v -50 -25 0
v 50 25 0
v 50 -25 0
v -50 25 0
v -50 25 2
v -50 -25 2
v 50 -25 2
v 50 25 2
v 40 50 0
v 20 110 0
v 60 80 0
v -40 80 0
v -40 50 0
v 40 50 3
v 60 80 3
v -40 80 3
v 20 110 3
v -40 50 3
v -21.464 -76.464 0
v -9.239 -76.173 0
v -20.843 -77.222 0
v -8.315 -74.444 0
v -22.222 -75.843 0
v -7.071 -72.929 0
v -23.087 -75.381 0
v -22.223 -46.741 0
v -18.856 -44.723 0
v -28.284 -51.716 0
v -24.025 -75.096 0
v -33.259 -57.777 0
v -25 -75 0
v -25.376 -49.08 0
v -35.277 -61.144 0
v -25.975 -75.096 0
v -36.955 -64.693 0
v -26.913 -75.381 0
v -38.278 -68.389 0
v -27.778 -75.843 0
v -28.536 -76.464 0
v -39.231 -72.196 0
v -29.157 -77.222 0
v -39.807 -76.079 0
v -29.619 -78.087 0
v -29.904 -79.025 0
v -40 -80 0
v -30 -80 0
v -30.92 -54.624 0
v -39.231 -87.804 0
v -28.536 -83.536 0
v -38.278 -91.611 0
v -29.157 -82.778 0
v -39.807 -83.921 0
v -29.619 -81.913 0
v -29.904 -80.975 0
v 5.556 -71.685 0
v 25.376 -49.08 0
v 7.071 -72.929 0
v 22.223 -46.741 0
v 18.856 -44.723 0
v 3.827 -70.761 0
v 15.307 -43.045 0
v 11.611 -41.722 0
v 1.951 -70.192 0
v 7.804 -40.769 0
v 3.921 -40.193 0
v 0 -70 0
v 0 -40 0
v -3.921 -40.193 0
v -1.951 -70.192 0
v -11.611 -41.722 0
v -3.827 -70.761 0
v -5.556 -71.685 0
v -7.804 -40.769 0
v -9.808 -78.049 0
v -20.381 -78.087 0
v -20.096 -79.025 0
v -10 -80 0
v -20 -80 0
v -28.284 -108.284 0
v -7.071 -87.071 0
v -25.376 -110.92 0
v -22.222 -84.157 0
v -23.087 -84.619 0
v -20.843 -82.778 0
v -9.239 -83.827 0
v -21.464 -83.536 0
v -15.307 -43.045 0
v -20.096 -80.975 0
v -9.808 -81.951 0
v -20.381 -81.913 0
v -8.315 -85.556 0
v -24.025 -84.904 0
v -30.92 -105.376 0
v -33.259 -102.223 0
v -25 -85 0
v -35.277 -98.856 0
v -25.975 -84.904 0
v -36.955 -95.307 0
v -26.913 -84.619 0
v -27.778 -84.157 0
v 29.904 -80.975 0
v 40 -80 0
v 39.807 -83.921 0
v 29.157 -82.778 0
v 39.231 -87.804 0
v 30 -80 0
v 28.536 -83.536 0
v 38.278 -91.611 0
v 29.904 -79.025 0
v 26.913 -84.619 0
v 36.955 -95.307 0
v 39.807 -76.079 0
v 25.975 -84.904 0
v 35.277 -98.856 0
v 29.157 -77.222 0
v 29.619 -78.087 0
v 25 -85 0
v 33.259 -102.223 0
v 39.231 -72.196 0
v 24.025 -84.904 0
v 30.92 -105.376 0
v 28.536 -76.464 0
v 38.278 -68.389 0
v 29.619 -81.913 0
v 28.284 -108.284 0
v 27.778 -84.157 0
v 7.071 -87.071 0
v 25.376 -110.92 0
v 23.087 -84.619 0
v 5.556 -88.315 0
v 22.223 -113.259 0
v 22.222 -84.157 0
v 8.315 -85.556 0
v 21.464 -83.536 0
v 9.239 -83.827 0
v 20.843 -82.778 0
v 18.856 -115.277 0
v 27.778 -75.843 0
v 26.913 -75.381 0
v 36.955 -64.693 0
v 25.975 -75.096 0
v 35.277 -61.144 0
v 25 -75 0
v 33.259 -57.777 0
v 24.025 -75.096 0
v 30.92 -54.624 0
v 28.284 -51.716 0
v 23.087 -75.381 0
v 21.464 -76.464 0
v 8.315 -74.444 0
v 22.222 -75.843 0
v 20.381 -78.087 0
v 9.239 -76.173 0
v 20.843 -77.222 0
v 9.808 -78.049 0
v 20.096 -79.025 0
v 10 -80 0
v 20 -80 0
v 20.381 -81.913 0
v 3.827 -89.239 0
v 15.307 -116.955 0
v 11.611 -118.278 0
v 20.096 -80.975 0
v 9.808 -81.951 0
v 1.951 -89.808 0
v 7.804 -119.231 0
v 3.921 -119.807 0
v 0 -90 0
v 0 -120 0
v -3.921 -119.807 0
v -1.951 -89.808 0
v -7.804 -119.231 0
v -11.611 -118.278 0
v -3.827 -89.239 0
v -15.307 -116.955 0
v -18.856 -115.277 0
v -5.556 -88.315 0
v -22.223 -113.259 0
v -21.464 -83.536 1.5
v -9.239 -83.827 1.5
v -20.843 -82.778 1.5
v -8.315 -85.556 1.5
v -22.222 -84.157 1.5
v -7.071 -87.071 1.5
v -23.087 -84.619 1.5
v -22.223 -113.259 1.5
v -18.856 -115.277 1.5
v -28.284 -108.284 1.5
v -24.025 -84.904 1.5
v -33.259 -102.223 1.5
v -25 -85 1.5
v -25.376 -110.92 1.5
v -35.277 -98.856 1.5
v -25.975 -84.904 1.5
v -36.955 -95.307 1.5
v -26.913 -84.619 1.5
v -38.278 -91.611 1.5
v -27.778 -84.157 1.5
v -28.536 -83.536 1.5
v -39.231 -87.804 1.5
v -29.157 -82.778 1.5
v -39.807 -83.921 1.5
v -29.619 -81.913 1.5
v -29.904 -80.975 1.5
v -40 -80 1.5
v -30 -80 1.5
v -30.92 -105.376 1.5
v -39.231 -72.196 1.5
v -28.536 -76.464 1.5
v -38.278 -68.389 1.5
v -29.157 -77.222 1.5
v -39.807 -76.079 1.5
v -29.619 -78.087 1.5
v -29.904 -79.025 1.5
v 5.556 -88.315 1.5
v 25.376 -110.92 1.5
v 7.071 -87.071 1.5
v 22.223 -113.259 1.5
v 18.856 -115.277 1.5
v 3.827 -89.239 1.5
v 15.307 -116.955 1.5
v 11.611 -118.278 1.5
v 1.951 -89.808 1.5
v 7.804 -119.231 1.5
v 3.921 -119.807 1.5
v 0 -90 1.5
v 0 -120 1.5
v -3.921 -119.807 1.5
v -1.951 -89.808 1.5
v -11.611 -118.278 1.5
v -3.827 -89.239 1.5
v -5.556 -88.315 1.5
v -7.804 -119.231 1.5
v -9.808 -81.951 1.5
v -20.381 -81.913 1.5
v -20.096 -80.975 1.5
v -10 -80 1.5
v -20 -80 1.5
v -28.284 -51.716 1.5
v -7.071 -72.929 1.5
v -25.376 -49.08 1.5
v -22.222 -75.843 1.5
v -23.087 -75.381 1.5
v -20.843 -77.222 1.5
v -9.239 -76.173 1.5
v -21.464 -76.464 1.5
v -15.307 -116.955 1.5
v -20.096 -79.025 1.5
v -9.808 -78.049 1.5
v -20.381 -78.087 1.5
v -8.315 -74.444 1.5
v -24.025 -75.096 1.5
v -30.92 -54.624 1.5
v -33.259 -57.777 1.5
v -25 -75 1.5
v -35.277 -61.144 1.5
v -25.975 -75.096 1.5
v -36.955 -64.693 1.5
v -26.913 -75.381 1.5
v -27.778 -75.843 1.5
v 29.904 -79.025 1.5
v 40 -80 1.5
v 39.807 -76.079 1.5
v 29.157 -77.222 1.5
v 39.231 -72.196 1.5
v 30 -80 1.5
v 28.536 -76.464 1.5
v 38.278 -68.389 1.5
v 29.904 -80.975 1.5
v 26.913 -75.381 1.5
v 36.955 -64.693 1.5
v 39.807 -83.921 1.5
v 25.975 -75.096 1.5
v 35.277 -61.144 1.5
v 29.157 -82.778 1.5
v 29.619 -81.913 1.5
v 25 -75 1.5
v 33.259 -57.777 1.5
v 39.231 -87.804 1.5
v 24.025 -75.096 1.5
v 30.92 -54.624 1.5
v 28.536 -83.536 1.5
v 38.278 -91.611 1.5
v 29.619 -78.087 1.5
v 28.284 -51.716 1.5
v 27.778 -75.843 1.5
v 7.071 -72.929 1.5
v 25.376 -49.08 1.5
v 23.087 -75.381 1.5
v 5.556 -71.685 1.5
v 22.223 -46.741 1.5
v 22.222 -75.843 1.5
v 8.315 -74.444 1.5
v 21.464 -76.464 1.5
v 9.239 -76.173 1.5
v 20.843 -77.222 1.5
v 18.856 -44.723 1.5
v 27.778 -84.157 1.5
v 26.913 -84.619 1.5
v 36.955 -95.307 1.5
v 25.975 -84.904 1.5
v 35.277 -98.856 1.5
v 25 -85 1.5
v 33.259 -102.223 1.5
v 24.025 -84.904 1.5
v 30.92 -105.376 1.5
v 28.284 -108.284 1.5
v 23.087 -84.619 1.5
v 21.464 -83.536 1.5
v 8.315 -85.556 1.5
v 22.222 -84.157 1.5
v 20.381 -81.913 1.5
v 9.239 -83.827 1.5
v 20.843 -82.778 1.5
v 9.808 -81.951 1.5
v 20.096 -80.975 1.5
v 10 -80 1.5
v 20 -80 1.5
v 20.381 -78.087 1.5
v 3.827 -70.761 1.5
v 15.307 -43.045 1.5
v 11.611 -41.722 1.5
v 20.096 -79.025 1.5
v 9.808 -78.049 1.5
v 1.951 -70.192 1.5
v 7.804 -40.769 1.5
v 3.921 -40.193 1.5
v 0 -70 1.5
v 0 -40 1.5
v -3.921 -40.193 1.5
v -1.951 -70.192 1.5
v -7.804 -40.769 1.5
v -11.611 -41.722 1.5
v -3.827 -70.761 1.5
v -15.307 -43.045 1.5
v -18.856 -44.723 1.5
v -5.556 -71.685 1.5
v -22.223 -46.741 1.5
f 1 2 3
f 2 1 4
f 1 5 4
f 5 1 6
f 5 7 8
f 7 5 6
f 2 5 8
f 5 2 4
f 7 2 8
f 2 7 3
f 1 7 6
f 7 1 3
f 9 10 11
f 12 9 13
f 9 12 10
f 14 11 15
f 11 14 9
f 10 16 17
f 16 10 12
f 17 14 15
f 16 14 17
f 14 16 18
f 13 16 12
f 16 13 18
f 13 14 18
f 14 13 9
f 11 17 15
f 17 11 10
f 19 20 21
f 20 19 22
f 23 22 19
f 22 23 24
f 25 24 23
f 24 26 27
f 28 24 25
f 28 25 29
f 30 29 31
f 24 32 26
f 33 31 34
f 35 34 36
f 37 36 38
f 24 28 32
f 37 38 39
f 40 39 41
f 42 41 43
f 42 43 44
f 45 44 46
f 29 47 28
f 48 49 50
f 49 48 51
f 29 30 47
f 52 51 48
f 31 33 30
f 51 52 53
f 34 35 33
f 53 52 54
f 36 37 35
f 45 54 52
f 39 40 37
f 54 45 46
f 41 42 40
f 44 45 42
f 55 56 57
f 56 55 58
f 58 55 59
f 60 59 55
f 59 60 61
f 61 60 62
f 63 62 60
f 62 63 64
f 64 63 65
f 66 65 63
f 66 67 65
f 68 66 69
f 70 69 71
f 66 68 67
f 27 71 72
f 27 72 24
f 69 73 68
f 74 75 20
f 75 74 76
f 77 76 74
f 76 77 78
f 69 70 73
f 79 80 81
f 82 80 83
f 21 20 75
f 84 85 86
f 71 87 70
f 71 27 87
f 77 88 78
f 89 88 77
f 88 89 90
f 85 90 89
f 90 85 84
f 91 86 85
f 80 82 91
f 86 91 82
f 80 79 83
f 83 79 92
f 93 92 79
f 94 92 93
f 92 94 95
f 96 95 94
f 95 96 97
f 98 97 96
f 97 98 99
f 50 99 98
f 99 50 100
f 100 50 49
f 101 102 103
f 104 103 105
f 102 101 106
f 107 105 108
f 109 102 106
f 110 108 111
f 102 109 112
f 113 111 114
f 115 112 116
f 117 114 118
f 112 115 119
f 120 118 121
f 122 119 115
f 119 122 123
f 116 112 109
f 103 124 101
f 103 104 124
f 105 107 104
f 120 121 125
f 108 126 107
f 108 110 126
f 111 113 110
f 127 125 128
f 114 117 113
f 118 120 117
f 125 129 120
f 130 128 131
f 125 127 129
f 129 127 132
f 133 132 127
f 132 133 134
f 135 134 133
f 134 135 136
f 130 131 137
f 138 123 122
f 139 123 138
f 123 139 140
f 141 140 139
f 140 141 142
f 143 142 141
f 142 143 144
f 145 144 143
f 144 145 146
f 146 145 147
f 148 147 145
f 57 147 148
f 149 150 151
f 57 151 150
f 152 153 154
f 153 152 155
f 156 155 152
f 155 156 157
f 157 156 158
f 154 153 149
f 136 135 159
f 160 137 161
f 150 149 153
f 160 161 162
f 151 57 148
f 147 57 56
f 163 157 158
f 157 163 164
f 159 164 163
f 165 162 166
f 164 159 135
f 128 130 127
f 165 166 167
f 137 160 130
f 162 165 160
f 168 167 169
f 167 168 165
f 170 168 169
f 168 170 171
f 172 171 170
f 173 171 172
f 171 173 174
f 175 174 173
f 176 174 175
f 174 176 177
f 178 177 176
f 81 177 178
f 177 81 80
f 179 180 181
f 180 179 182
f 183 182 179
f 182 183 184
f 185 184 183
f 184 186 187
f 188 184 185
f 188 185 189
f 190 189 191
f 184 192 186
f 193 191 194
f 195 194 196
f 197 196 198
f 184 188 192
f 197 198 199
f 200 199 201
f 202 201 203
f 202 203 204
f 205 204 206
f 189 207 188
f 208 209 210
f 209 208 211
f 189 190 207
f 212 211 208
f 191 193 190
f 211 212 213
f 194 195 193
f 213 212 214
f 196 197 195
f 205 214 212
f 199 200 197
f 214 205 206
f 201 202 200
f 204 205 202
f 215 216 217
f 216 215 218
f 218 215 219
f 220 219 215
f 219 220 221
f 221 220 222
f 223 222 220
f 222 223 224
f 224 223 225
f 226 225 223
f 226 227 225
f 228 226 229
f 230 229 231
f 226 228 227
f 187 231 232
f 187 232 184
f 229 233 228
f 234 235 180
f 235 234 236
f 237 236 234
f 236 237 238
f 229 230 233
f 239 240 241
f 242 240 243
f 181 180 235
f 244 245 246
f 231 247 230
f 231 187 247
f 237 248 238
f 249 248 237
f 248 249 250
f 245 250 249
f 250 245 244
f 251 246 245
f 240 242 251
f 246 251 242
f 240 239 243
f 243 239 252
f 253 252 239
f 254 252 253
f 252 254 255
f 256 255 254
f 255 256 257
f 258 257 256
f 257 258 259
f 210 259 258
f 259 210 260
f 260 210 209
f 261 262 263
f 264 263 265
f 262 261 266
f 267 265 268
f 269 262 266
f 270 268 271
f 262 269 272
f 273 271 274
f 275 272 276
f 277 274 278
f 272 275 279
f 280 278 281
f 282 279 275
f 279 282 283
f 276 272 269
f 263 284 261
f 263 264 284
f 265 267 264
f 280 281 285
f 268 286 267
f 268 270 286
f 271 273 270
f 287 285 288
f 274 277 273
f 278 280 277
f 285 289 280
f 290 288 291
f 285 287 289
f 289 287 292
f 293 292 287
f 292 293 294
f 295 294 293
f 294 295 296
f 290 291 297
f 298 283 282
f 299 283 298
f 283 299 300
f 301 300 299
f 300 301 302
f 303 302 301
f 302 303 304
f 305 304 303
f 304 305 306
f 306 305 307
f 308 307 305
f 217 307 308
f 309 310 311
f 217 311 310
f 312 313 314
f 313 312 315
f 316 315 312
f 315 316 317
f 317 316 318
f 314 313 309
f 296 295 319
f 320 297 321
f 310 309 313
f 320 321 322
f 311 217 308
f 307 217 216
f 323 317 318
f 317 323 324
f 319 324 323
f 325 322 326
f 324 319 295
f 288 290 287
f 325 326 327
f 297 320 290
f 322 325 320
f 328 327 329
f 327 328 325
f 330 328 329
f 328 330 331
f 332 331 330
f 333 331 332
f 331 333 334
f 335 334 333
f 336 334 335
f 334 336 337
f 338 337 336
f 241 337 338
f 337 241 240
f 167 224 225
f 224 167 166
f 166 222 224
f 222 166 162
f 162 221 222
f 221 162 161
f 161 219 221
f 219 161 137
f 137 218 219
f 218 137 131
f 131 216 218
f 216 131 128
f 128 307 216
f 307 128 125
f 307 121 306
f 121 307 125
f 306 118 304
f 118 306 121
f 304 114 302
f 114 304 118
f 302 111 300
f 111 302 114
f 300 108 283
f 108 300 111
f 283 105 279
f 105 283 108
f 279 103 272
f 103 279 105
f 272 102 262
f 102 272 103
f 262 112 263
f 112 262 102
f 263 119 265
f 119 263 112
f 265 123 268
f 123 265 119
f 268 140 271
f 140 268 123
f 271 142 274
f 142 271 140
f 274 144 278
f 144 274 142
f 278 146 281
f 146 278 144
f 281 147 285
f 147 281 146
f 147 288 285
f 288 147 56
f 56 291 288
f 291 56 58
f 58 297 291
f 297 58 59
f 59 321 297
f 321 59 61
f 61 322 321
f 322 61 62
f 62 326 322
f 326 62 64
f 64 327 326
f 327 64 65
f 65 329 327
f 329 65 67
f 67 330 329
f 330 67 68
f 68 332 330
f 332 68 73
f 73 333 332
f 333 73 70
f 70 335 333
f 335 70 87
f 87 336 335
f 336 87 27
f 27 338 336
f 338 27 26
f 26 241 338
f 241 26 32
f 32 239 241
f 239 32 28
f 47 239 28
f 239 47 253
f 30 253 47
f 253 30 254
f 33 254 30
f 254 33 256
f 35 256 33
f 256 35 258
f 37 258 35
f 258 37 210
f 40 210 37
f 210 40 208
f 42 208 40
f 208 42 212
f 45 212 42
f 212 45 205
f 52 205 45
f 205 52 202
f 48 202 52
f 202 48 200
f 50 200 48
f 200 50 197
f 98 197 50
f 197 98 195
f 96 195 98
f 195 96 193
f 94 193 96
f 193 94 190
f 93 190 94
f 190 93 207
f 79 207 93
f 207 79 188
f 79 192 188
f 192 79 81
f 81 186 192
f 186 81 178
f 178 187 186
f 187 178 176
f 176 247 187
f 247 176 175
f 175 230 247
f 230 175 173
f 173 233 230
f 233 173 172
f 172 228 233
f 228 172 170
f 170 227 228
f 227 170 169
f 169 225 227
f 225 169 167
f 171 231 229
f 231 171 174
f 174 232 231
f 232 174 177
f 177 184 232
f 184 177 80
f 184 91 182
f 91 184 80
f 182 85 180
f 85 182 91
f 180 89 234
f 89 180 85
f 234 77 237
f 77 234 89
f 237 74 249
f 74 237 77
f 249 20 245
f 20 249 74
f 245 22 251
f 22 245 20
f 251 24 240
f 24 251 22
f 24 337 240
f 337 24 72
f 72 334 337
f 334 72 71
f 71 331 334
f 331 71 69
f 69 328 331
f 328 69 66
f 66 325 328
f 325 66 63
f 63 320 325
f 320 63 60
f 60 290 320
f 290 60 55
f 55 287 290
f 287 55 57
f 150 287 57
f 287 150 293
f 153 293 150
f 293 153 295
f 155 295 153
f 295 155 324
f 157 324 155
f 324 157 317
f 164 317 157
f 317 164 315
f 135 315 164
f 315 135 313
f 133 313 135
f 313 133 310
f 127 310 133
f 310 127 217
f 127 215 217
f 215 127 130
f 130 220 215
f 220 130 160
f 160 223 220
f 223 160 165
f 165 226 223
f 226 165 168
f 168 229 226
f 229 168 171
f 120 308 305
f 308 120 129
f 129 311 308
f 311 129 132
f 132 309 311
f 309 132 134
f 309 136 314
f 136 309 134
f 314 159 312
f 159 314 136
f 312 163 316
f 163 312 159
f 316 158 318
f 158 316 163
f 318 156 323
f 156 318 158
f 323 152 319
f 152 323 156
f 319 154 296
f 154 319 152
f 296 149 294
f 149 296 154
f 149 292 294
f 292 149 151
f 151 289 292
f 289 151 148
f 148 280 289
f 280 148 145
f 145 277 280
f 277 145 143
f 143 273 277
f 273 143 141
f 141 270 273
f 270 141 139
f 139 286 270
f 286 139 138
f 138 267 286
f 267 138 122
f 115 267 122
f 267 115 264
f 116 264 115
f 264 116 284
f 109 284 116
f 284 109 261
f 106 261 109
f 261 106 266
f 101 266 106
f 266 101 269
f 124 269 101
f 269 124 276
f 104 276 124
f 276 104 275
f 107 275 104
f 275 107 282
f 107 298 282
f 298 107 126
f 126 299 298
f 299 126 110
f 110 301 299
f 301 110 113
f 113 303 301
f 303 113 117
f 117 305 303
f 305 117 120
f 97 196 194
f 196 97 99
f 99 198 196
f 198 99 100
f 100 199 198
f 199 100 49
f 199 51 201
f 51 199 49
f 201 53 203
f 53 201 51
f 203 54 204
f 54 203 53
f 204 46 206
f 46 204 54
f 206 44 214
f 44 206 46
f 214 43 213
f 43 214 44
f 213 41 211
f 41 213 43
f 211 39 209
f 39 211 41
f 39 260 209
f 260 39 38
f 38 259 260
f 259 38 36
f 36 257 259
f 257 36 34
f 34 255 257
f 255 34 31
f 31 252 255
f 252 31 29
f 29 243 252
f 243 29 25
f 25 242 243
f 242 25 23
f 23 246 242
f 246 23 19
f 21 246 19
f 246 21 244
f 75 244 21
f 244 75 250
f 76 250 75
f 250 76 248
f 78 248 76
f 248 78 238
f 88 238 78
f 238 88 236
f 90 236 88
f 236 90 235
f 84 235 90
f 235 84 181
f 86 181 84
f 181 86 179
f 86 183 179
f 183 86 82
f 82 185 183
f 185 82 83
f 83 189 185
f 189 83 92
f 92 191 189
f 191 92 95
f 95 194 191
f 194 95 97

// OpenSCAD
// --------------------------------------------------------
// Parametric "Base Wall" (Planar Sheet Metal)
// --------------------------------------------------------

// The module applies a uniform thickness to ANY 2D shape provided to it.
module base_wall(thickness) {
    // linear_extrude pushes the 2D shape up along the Z-axis
    linear_extrude(height = thickness) {
        children(); // This pulls in whatever 2D geometry is nested inside the module call
    }
}

// ==========================================
// Example Usage & Visualization
// ==========================================

// Example 1: A simple rectangular Base Wall (e.g., a standard blank)
color("Silver")
base_wall(thickness = 2) {
    // This is your "Sketch"
    square([100, 50], center = true);
}

// Example 2: A Base Wall from a custom profile (Polygon)
translate([0, 70, 0])
color("LightSlateGray")
base_wall(thickness = 3) {
    // This represents a custom sketched boundary
    polygon(points=[
        [-40, -20], 
        [40, -20], 
        [60, 10], 
        [20, 40], 
        [-40, 10]
    ]);
}

// Example 3: A Base Wall with internal cutouts sketched directly into it
translate([0, -80, 0])
color("SteelBlue")
base_wall(thickness = 1.5) {
    // In CATIA, putting a circle inside another circle in a sketch creates a hole.
    // In OpenSCAD, we use 2D difference() inside the base_wall to achieve the same result.
    difference() {
        // Outer profile
        circle(d = 80, $fn=64);
        
        // Inner cutouts (holes)
        circle(d = 20, $fn=32);
        translate([25, 0, 0]) circle(d = 10, $fn=32);
        translate([-25, 0, 0]) circle(d = 10, $fn=32);
    }
}
